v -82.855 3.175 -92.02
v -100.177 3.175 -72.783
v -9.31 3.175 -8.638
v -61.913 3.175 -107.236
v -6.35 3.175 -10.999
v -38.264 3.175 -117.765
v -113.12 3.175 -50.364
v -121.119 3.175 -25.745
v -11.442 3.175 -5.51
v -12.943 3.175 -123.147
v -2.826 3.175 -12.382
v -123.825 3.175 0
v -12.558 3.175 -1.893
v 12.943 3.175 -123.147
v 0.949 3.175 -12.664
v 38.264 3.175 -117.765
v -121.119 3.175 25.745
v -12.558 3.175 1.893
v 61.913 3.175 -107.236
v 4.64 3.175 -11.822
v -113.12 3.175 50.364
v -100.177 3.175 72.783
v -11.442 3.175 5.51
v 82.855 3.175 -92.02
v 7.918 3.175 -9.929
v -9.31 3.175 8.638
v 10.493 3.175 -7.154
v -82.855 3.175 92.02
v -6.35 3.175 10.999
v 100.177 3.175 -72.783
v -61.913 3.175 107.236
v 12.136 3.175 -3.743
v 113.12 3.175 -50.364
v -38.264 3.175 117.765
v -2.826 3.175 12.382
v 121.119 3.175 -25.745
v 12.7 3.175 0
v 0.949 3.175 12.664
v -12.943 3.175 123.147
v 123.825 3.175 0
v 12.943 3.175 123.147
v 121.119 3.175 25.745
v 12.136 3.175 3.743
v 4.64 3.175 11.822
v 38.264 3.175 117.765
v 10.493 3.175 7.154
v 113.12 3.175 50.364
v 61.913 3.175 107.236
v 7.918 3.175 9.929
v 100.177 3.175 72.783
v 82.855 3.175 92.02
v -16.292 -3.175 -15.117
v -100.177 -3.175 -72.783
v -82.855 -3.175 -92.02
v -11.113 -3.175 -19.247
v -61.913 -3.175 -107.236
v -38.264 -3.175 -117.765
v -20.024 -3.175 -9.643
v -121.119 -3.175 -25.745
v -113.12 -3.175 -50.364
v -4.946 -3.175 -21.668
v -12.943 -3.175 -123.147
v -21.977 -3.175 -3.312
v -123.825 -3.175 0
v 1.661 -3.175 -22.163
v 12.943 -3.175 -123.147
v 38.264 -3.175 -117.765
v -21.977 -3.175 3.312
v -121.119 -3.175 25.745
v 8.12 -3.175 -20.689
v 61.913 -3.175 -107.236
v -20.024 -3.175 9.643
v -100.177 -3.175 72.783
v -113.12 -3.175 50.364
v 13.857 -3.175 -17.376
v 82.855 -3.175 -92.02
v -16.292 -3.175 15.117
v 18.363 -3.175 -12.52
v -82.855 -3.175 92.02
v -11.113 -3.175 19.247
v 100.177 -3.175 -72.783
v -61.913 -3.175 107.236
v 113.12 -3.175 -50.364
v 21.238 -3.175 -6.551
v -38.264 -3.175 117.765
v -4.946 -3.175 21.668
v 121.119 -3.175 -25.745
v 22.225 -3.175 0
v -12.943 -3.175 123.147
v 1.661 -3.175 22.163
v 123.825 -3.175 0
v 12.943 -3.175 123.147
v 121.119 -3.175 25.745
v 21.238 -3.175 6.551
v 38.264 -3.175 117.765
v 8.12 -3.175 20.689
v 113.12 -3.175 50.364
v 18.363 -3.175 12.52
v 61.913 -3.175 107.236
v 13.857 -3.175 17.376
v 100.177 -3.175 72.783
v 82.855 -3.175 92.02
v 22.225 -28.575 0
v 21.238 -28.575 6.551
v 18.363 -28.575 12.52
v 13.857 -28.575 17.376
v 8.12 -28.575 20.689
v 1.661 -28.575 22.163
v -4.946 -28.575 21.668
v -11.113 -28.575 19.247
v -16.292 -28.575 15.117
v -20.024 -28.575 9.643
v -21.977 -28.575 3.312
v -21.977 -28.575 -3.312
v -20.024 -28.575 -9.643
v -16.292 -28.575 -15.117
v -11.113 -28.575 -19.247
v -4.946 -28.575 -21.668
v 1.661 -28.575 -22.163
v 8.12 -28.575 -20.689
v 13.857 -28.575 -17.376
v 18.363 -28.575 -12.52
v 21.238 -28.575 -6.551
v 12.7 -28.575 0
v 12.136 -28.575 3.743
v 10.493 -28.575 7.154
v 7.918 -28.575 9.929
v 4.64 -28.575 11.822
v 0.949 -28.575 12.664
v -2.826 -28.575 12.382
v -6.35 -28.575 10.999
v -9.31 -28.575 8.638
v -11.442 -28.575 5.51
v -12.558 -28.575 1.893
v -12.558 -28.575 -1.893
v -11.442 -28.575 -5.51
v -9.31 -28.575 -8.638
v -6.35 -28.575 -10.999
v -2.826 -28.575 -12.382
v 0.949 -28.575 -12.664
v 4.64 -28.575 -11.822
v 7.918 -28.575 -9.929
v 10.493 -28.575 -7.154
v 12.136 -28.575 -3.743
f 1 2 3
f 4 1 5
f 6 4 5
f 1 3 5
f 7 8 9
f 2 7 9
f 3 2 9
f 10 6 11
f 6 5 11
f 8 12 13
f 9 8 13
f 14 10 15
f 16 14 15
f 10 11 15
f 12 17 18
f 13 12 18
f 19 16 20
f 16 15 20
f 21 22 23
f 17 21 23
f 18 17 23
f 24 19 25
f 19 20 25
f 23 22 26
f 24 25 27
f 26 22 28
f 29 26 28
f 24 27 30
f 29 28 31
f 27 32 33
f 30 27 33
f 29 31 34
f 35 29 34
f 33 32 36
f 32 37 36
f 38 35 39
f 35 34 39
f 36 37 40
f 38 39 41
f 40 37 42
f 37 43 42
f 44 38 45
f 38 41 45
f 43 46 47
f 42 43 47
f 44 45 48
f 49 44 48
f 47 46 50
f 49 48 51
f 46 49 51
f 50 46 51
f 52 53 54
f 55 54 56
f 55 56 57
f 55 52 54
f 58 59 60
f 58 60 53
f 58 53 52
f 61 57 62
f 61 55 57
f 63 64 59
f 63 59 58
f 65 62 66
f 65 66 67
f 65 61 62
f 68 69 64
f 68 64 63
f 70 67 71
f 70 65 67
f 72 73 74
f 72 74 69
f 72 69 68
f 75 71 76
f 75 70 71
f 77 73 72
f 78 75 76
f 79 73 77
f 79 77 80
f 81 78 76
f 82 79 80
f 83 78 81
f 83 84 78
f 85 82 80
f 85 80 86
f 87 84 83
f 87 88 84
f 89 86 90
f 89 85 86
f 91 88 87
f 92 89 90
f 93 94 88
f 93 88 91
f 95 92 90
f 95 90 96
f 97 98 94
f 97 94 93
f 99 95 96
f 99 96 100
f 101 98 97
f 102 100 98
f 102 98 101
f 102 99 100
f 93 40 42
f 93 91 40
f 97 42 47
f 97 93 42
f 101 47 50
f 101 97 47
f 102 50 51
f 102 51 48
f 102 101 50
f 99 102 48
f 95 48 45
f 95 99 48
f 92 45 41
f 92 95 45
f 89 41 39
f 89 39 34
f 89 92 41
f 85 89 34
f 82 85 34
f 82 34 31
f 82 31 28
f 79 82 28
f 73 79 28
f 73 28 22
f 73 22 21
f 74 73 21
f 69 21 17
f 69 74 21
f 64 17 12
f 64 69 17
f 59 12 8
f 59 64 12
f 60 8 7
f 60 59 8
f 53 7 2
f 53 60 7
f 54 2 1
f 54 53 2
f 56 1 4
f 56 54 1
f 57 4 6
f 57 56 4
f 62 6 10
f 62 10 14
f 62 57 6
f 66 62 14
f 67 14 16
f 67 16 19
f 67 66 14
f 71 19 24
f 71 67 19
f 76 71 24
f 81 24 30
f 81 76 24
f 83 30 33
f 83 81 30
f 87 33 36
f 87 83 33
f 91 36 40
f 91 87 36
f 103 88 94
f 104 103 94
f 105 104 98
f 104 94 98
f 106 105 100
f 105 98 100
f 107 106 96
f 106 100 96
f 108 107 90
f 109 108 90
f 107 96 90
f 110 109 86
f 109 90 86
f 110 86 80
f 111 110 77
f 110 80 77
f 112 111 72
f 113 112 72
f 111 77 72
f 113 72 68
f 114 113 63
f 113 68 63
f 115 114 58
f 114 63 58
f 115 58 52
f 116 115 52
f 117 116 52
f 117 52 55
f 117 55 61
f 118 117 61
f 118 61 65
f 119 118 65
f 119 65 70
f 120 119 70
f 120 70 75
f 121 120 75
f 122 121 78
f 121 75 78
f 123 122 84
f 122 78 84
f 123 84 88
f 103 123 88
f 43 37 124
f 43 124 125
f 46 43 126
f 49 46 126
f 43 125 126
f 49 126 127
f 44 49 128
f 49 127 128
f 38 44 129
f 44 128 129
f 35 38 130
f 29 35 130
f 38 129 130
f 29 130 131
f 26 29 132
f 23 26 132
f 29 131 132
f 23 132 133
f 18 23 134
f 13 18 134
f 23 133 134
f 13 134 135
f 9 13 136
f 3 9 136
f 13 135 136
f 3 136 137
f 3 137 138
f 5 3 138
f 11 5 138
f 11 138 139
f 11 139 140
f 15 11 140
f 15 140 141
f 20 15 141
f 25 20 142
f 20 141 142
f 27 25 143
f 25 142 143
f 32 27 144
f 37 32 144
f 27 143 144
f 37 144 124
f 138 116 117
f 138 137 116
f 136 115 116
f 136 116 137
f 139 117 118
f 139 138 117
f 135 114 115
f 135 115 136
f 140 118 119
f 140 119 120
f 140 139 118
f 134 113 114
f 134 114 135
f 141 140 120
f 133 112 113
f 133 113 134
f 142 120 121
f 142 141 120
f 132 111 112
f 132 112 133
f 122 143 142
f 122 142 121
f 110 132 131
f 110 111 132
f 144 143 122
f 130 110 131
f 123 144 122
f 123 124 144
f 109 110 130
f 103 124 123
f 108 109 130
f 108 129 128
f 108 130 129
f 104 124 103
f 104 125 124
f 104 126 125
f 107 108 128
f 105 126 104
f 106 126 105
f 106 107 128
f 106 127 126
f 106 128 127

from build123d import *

# Parameters (mm, degrees)
F0_R     = 123.825
F1_DEPTH = 3.175
F2_R     = 22.225
F3_DEPTH = 25.4
F4_R     = 12.7
F5_DEPTH = 50.8


with BuildPart() as f1:
    # F0 (on Front) → F1 (new body, symmetric)
    with BuildSketch(Plane.XZ):
        Circle(F0_R)
    extrude(amount=F1_DEPTH, both=True)

    # F2 (on face) → F3 (join)
    with BuildSketch(Plane.XZ.offset(3.175)):
        Circle(F2_R)
    extrude(amount=F3_DEPTH)

    # F4 (on face) → F5 (cut, symmetric)
    with BuildSketch(Plane.XZ.offset(28.575)):
        Circle(F4_R)
    extrude(amount=F5_DEPTH, both=True, mode=Mode.SUBTRACT)


solid = f1.part
